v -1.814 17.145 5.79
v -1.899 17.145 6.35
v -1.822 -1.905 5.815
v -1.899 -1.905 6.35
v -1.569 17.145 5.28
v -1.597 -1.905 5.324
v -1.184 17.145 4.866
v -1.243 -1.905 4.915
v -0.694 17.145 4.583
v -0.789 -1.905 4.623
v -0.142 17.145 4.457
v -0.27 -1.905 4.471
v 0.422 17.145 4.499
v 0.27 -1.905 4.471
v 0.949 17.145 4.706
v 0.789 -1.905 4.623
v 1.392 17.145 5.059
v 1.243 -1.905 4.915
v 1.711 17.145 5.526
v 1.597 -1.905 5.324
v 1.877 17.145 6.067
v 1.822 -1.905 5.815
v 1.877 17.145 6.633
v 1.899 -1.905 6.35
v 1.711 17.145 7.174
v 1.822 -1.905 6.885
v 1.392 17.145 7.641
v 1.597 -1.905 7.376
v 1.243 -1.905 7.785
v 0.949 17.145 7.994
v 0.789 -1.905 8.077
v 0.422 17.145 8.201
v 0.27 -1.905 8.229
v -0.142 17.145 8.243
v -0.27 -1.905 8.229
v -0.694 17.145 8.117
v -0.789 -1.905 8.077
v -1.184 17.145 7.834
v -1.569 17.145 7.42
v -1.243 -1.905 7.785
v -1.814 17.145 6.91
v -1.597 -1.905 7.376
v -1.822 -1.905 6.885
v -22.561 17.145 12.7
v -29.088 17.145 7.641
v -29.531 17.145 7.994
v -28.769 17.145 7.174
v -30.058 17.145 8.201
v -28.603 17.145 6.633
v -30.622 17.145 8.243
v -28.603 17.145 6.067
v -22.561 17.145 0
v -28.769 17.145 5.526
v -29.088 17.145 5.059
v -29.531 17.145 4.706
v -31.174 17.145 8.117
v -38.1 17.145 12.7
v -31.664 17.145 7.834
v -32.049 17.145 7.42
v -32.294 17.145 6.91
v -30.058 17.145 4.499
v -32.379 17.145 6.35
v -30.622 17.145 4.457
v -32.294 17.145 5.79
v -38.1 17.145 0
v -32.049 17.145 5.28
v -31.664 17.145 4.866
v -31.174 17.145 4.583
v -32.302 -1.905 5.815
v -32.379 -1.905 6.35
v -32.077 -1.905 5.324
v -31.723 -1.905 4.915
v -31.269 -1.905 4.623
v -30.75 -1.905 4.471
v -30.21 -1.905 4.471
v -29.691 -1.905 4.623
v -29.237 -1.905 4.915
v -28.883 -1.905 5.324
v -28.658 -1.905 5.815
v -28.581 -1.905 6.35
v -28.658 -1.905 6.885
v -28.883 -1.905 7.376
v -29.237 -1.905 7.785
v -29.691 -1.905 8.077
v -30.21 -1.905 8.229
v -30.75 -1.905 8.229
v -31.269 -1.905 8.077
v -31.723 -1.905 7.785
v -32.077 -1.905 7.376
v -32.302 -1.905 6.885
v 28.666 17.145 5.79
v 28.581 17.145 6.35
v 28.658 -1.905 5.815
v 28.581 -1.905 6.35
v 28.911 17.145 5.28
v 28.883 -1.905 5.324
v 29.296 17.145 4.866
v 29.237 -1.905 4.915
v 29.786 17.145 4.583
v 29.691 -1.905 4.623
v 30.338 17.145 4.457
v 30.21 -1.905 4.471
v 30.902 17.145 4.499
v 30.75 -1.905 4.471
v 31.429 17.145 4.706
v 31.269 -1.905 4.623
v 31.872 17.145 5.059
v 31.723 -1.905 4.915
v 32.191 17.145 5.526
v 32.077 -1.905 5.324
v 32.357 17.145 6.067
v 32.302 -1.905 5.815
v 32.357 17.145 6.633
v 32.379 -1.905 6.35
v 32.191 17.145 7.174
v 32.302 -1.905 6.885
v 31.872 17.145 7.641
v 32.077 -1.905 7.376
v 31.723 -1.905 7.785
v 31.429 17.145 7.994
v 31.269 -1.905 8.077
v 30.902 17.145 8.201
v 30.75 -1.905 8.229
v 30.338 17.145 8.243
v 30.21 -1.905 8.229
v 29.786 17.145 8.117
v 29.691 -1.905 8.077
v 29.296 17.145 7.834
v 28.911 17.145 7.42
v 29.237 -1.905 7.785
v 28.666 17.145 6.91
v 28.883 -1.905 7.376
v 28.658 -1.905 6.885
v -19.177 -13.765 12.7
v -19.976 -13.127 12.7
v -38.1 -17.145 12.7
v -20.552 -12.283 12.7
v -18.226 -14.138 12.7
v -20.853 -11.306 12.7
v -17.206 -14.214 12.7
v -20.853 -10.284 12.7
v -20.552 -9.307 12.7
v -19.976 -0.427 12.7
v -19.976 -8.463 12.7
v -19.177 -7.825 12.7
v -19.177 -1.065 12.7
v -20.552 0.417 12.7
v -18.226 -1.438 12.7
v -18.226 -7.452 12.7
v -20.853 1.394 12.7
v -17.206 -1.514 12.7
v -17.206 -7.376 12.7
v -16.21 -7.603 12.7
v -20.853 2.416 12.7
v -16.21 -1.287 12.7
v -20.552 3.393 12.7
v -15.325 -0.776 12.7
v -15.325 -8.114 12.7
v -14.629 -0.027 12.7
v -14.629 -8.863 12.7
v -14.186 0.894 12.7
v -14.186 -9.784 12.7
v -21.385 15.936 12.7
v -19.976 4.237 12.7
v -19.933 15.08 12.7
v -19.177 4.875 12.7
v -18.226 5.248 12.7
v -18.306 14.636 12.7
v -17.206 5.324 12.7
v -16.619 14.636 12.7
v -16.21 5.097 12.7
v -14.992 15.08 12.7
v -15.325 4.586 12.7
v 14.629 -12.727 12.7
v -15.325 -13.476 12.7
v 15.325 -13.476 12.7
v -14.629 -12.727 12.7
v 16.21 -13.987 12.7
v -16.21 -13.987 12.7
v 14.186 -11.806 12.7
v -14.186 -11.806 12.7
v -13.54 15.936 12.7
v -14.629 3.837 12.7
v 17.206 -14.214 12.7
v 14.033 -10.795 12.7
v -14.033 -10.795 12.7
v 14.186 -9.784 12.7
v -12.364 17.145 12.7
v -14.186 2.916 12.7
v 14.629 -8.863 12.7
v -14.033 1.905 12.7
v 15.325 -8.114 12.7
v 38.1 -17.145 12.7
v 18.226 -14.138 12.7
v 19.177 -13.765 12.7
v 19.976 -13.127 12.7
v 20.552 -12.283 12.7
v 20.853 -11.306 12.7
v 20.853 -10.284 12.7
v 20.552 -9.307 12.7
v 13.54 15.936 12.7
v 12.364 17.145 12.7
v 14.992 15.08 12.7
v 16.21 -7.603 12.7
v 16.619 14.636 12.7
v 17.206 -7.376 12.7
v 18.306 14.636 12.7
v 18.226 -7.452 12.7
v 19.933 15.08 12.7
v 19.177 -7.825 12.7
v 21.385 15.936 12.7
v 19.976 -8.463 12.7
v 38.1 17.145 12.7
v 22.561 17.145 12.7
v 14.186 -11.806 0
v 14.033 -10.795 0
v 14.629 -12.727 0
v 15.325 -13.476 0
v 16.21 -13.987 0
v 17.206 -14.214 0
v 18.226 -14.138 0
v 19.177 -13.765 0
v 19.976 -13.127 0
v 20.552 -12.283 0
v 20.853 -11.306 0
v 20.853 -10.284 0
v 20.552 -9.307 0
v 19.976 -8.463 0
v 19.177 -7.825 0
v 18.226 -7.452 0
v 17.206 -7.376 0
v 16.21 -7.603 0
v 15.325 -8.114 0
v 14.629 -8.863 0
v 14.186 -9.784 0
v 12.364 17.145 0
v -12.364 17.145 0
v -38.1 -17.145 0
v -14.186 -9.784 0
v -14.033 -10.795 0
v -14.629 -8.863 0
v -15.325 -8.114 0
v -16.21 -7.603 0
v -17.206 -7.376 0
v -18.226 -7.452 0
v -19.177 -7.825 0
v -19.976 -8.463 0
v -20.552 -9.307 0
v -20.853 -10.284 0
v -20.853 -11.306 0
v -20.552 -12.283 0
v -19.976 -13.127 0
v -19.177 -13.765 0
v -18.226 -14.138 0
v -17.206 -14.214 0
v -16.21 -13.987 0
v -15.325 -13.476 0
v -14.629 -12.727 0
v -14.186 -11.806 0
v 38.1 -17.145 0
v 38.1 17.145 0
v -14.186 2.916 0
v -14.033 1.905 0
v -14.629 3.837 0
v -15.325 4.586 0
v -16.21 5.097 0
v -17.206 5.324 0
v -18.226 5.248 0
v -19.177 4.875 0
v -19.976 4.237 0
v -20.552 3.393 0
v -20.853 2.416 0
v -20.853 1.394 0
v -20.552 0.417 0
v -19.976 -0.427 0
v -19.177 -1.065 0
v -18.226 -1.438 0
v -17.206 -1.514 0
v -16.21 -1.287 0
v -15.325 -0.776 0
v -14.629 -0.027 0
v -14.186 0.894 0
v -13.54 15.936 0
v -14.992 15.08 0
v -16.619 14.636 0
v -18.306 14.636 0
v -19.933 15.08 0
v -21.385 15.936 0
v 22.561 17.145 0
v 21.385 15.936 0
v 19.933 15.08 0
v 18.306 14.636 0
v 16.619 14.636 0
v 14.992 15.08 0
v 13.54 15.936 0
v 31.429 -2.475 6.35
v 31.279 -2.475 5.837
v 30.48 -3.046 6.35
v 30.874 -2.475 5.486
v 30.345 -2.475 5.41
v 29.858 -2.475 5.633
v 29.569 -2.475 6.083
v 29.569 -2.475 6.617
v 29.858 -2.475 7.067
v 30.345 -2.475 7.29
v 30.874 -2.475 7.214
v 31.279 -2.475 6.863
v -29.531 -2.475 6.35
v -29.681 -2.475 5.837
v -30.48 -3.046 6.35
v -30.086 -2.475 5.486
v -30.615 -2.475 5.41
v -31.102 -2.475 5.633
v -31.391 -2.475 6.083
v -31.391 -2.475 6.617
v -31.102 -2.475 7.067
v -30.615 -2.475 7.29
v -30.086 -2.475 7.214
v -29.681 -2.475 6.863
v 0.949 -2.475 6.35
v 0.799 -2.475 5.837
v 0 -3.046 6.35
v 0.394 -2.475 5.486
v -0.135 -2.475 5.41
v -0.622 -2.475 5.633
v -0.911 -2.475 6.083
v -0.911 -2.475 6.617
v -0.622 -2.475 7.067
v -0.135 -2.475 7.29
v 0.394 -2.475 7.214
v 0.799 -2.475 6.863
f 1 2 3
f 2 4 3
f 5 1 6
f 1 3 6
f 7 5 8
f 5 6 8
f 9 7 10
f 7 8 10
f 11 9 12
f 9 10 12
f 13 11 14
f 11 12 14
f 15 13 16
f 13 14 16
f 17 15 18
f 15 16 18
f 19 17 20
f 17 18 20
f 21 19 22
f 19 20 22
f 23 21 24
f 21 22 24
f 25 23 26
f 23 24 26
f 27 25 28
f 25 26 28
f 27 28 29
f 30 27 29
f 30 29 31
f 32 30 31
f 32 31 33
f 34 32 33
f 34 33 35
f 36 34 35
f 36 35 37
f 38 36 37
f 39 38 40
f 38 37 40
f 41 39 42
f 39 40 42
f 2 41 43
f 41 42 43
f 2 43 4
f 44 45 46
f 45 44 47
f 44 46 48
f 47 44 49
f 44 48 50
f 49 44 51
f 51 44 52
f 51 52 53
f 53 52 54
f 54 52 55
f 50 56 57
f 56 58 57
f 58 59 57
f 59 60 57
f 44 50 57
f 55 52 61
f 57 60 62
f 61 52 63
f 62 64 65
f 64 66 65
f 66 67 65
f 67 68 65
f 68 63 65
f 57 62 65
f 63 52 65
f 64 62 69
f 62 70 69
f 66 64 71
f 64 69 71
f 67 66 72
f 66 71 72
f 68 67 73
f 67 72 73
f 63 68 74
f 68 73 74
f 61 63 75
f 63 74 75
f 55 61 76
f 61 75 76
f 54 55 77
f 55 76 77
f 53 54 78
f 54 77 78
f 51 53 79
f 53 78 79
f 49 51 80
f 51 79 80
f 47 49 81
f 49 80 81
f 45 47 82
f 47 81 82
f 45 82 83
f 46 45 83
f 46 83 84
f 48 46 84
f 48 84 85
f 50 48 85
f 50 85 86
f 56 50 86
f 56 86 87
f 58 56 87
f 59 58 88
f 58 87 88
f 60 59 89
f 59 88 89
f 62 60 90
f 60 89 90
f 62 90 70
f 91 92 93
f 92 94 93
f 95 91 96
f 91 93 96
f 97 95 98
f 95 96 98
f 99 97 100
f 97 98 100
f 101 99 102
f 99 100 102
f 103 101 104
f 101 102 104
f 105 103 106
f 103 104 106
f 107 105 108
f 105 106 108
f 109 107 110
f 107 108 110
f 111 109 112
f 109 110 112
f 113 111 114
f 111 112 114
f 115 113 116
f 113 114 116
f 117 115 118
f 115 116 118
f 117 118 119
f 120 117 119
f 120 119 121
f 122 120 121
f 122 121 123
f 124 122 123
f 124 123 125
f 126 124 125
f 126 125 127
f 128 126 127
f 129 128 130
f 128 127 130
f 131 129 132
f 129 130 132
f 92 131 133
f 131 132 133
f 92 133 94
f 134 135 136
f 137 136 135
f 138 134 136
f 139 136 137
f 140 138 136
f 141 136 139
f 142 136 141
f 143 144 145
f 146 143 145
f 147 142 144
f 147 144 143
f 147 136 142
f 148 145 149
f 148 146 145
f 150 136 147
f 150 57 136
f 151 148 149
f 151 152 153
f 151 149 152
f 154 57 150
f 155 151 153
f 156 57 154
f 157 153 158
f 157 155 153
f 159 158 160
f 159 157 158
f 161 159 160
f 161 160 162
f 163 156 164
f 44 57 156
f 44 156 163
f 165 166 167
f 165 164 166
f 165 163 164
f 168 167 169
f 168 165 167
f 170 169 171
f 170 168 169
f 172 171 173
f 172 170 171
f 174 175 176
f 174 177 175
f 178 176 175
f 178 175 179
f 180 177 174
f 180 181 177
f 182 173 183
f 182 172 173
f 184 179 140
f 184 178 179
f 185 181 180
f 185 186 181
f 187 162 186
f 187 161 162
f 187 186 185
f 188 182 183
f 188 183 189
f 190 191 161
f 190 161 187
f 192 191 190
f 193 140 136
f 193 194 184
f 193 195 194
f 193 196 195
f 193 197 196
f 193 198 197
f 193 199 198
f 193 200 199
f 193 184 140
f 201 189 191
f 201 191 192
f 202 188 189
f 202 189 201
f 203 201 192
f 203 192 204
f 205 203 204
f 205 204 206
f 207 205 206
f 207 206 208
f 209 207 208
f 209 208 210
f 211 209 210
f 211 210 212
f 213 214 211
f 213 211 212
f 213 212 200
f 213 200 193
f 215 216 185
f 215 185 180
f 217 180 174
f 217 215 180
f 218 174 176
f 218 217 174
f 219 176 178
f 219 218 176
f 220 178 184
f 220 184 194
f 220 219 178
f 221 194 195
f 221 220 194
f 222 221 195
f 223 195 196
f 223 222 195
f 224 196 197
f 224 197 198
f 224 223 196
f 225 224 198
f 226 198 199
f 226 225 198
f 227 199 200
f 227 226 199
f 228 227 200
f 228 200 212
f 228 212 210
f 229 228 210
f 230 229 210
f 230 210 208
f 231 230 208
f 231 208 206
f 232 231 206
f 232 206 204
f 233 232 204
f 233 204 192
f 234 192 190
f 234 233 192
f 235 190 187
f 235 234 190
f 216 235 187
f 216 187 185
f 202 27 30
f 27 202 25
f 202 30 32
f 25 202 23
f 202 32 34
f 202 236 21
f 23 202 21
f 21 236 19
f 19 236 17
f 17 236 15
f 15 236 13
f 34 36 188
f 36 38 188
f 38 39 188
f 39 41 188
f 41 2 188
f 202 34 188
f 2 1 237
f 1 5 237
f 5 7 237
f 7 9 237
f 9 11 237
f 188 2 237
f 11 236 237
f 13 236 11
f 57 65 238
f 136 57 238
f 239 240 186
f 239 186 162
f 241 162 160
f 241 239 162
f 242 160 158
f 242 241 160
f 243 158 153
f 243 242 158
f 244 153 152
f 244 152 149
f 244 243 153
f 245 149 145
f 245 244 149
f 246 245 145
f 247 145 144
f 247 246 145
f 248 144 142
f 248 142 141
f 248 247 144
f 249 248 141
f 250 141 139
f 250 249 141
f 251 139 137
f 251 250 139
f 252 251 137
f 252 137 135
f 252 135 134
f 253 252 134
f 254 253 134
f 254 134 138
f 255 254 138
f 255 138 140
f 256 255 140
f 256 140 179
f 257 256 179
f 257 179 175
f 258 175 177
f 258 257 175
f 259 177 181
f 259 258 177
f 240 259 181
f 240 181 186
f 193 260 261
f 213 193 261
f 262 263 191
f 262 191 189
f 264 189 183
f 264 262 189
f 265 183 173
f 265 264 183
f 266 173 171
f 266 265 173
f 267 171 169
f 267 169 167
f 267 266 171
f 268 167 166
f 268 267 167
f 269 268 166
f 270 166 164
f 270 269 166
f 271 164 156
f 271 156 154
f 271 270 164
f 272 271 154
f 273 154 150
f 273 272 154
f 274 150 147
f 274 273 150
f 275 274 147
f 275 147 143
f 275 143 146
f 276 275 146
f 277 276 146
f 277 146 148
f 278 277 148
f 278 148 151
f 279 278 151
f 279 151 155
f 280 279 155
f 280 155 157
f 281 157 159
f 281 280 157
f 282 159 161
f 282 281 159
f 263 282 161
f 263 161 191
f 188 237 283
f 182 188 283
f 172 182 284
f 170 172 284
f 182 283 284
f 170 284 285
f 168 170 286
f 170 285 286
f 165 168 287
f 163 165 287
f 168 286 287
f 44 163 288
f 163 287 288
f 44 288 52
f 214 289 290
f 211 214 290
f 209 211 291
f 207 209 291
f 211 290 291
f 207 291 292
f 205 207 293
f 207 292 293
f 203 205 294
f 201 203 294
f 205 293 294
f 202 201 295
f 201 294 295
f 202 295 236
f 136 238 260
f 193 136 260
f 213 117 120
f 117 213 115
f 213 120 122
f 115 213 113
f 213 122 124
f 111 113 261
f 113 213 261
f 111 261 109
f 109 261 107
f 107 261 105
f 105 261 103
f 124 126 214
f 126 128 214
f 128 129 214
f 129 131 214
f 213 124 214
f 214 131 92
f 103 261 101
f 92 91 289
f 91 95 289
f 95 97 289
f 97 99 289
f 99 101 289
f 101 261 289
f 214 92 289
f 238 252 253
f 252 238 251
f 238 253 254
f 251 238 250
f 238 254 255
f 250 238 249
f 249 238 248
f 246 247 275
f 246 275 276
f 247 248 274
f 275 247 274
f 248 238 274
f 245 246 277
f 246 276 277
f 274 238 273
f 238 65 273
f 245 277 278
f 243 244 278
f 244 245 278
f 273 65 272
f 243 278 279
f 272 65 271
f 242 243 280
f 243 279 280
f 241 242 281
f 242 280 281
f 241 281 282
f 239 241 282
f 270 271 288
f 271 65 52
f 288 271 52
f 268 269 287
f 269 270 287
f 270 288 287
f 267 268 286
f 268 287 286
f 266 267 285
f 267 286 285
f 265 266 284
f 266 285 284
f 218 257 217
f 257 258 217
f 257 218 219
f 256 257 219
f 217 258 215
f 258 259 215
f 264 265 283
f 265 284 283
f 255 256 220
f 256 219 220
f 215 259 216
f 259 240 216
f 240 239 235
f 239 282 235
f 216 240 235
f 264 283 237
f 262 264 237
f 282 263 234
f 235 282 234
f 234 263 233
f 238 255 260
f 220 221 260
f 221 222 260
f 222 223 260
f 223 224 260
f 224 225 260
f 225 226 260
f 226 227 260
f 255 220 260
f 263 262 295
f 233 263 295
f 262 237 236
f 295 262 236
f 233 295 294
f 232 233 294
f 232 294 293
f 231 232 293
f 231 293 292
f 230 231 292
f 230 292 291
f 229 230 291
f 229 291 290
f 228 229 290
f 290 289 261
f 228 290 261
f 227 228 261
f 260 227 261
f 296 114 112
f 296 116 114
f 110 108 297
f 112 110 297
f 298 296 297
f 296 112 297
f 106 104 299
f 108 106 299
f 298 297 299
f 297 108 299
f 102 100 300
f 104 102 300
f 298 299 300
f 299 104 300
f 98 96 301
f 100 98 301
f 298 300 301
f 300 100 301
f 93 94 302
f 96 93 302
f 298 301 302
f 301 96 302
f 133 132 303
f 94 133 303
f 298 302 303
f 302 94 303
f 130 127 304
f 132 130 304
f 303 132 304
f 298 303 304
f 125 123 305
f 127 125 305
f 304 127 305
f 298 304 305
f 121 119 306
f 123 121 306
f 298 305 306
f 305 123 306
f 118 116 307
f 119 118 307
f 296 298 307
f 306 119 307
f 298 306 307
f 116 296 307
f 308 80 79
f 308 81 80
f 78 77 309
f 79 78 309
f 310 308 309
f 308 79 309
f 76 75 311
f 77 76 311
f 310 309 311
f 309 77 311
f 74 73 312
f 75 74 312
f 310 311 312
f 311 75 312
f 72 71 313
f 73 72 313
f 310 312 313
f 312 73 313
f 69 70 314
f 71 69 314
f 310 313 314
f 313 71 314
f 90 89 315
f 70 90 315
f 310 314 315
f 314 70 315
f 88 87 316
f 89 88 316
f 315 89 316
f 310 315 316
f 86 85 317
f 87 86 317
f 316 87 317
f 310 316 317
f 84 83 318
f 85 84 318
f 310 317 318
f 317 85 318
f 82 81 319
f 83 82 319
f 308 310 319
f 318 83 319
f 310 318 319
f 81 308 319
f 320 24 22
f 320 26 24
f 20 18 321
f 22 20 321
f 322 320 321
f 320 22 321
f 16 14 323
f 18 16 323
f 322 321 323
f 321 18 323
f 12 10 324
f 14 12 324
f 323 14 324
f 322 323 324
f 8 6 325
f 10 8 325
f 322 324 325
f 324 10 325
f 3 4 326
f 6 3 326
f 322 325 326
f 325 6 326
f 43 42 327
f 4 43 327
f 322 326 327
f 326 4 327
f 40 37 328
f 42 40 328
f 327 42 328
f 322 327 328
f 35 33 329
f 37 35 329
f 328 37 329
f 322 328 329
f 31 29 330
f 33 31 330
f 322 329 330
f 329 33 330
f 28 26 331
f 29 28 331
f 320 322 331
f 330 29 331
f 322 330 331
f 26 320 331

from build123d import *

# Parameters (mm, degrees)
SKETCH1_R                  = 3.429
BOSS_EXTRUDE1_DEPTH        = 12.7
F_10_24_TAPPED_HOLE1_D     = 3.7973
F_10_24_TAPPED_HOLE1_DEPTH = 19.05
F_10_24_TAPPED_HOLE1_TIP   = 1.140824014


with BuildPart() as part:
    # Sketch1 → Boss-Extrude1 (new body)
    with BuildSketch(Plane.XY):
        with BuildLine():
            Line((-38.1, -17.145), (38.1, -17.145))
            Line((38.1, -17.145), (38.1, 17.145))
            Line((38.1, 17.145), (22.561451151, 17.145))
            ThreePointArc((22.561451151, 17.145), (17.4625, 14.5796), (12.363548849, 17.145))
            Line((12.363548849, 17.145), (-12.363548849, 17.145))
            ThreePointArc((-12.363548849, 17.145), (-17.4625, 14.5796), (-22.561451151, 17.145))
            Line((-22.561451151, 17.145), (-38.1, 17.145))
            Line((-38.1, 17.145), (-38.1, -17.145))
        make_face()
        with Locations((-17.4625, -10.795)):
            Circle(SKETCH1_R, mode=Mode.SUBTRACT)
        with Locations(Location((17.4625, -10.795, 0), (0, 0, 180))):
            Circle(SKETCH1_R, mode=Mode.SUBTRACT)
        with Locations((-17.4625, 1.905)):
            Circle(SKETCH1_R, mode=Mode.SUBTRACT)
    extrude(amount=BOSS_EXTRUDE1_DEPTH)

    # #10-24 Tapped Hole1
    with Locations(Plane(origin=(0, 17.145, 0), x_dir=(1, 0, 0), z_dir=(0, 1, 0))):
        with Locations((30.48, -6.35), (-30.48, -6.35), (0, -6.35)):
            Hole(F_10_24_TAPPED_HOLE1_D / 2, depth=F_10_24_TAPPED_HOLE1_DEPTH)
            with Locations((0, 0, -(F_10_24_TAPPED_HOLE1_DEPTH + F_10_24_TAPPED_HOLE1_TIP / 2))):  # 118° drill point
                Cone(0, F_10_24_TAPPED_HOLE1_D / 2, F_10_24_TAPPED_HOLE1_TIP, mode=Mode.SUBTRACT)


solid = part.part
